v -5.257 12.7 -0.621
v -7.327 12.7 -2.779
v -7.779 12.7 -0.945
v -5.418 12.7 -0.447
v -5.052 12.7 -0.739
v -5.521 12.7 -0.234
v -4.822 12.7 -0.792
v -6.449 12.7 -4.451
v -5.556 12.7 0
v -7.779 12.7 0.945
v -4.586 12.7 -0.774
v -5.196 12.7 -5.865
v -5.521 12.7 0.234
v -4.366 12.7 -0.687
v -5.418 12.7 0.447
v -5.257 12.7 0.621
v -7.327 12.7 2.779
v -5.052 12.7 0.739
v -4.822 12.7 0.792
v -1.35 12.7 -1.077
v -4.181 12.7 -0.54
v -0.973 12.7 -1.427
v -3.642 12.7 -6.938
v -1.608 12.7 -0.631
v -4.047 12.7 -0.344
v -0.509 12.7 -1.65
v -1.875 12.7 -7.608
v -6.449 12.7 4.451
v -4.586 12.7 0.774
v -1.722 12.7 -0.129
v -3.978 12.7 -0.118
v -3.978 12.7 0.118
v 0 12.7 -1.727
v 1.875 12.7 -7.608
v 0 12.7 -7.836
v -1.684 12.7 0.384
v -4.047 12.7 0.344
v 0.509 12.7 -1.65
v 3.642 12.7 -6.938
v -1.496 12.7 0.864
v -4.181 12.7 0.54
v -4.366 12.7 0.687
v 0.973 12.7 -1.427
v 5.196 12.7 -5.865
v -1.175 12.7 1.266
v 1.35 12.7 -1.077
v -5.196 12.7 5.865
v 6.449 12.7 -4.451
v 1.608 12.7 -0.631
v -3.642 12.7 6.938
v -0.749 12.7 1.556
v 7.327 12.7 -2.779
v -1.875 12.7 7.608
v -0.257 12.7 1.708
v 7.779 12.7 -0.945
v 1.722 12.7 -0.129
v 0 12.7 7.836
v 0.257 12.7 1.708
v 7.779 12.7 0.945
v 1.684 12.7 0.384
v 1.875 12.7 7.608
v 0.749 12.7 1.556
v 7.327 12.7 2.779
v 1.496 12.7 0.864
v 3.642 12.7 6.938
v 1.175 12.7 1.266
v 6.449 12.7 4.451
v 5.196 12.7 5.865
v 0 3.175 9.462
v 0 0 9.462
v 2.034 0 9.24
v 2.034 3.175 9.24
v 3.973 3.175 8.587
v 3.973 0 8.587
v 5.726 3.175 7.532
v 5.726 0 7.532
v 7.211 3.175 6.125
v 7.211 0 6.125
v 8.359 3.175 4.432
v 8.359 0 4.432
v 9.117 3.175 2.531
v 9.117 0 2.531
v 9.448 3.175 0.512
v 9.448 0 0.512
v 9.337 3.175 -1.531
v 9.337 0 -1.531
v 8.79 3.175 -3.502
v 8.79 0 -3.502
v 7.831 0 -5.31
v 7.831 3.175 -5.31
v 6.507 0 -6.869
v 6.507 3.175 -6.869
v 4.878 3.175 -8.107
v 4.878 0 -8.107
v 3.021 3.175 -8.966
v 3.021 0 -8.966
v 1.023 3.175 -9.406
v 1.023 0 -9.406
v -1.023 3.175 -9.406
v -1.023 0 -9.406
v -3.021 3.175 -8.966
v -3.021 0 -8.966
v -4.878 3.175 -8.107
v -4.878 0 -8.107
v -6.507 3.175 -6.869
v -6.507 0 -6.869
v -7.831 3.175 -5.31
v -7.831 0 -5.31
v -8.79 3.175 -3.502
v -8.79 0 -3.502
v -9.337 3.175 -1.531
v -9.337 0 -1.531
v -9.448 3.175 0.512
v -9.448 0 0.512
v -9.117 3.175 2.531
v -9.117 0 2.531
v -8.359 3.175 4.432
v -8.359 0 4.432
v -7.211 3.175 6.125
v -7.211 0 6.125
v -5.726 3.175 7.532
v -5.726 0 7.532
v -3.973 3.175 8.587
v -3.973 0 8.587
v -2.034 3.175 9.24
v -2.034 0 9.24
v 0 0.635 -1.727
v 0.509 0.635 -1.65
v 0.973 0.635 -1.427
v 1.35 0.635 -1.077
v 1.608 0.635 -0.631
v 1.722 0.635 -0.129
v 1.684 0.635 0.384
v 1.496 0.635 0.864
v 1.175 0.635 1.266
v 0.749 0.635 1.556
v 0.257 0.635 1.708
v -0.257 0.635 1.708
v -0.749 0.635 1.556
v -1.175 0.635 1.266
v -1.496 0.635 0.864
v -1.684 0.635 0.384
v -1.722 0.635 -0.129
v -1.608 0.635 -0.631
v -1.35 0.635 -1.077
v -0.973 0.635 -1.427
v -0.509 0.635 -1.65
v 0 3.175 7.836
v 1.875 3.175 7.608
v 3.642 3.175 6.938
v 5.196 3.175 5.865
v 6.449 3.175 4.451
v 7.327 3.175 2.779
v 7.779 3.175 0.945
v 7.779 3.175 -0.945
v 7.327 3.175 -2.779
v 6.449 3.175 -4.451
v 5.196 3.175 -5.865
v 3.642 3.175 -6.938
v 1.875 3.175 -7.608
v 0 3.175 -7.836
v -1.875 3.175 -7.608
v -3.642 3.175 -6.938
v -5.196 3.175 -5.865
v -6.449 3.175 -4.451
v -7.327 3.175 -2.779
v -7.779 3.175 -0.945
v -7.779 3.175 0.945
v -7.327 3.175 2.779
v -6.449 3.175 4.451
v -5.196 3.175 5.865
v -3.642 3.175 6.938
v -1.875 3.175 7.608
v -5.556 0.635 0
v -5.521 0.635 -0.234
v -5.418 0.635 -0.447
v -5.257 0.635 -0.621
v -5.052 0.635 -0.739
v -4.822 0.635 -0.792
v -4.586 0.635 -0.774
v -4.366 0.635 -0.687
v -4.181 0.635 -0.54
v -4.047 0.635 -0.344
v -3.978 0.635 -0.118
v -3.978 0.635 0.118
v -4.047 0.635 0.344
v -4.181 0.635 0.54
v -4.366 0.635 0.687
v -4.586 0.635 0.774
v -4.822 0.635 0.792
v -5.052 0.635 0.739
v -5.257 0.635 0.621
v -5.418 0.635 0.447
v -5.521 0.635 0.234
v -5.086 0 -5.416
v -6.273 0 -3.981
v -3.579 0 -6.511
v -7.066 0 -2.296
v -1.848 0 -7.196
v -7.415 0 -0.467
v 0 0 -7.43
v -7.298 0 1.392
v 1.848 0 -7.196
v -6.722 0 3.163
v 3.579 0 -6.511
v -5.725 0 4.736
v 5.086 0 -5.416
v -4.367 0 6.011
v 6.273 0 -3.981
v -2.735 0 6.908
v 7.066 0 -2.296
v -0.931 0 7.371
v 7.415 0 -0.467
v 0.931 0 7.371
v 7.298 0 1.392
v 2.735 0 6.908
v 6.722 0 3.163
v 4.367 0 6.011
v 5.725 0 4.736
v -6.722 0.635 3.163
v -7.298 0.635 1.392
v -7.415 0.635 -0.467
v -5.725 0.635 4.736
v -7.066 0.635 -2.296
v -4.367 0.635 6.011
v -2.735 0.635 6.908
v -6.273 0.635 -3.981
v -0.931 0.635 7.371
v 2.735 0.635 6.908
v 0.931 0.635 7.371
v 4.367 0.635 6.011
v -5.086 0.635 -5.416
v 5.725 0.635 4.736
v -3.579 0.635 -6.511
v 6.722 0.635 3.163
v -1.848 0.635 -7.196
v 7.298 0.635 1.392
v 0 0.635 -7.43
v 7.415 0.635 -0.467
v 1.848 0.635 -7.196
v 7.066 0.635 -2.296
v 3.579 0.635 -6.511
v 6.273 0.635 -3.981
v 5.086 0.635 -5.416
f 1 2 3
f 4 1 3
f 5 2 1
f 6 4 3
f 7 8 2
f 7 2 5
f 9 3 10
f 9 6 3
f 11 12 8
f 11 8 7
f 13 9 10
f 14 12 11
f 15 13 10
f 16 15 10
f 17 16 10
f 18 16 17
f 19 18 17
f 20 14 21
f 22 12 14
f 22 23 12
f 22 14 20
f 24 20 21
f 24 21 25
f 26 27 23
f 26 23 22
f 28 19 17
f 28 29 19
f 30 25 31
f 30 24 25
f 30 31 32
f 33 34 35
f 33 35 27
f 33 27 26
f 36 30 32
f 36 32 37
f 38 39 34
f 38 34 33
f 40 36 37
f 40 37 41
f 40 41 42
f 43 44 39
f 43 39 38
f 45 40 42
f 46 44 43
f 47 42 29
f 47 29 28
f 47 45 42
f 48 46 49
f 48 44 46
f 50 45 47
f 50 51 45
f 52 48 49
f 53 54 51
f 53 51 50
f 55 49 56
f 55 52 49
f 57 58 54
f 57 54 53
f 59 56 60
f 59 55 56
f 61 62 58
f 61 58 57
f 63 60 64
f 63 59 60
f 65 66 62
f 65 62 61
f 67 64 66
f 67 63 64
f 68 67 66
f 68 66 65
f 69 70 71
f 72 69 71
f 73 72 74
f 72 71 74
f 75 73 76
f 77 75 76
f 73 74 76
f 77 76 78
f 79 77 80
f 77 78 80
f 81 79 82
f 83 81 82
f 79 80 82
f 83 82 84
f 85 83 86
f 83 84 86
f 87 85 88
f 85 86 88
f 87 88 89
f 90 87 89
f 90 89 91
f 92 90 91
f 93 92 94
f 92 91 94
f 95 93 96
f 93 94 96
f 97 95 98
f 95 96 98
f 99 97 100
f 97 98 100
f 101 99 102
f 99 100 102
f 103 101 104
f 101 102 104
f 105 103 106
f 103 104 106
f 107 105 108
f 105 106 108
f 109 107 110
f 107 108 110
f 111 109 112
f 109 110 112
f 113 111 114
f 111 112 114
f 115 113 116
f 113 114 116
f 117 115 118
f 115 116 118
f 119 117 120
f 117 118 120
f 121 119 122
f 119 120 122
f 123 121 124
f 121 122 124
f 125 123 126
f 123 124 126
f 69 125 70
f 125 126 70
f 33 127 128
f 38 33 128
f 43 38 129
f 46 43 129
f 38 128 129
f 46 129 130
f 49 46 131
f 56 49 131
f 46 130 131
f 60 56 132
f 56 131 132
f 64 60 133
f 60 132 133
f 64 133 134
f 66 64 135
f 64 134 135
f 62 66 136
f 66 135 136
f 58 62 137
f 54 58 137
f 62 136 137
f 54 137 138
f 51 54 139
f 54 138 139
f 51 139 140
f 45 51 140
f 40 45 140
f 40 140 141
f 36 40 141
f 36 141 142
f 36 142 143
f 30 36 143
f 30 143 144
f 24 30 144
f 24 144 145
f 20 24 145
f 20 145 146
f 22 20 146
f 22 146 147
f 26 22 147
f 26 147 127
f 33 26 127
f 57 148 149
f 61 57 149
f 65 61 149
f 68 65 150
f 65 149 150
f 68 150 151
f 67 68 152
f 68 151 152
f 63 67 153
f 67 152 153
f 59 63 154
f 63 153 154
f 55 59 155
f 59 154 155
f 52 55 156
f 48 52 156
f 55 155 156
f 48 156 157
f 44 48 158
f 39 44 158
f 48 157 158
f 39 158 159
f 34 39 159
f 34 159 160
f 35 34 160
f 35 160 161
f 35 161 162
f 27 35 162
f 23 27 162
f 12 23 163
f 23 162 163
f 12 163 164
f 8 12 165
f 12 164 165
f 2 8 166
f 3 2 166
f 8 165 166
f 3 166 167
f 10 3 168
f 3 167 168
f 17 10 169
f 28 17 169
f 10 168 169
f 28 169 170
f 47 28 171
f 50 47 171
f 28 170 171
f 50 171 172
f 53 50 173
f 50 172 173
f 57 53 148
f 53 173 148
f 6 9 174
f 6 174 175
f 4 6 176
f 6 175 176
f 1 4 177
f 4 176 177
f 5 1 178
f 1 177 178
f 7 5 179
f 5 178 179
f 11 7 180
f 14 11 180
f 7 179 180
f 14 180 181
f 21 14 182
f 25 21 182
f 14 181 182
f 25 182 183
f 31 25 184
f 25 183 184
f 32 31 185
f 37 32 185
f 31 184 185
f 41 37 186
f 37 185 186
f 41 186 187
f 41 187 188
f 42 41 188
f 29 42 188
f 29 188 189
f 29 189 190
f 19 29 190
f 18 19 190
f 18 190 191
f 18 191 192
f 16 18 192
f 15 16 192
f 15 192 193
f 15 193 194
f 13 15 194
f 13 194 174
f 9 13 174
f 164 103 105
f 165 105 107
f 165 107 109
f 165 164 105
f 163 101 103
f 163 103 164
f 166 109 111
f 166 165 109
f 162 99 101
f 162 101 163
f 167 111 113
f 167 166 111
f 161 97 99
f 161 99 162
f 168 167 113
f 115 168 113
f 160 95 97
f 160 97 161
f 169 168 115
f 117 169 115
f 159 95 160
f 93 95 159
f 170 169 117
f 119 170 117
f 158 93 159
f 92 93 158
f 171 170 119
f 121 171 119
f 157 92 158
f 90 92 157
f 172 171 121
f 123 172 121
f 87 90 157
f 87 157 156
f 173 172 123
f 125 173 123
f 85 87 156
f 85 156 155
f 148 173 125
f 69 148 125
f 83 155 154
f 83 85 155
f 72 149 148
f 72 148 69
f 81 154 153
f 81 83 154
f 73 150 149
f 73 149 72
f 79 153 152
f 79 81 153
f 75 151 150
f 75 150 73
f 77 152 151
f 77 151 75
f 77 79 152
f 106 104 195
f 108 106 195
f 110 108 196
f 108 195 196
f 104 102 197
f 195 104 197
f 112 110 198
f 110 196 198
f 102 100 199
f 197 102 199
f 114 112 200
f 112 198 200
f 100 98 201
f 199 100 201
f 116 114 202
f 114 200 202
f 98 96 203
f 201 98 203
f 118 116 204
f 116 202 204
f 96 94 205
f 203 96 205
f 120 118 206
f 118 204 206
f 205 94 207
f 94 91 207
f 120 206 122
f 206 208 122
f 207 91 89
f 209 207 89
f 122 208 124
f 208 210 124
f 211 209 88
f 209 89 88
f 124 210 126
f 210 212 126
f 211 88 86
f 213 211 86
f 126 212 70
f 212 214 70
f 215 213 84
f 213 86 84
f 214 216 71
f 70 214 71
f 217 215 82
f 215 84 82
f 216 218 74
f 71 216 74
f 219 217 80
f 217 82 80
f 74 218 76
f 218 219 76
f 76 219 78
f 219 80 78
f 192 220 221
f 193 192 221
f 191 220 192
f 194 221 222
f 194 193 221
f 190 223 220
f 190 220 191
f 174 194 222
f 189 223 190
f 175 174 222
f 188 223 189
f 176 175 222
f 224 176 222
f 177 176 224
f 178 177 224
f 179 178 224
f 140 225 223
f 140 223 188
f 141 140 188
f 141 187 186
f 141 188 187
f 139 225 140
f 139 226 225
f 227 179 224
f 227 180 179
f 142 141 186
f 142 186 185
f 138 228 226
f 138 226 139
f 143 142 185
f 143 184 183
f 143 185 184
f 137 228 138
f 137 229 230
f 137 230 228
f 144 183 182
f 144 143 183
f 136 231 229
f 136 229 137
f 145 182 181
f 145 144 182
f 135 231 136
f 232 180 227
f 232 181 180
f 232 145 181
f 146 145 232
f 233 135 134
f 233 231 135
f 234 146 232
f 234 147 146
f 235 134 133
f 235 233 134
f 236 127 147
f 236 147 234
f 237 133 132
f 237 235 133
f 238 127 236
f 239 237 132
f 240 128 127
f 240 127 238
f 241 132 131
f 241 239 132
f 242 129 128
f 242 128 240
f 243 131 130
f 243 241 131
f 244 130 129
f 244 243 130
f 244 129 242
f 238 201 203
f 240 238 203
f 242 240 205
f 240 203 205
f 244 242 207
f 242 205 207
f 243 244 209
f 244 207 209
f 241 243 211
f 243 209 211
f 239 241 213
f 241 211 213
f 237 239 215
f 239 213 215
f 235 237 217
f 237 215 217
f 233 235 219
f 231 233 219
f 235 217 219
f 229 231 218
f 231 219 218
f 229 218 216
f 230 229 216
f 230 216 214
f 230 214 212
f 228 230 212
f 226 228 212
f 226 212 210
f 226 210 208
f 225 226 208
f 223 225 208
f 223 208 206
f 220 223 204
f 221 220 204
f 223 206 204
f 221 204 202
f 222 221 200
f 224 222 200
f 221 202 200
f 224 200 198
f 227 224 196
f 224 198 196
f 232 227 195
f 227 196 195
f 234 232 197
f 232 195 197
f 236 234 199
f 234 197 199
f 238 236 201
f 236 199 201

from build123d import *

# Parameters (mm, degrees)
SKETCH1_R                      = 9.4615
EXTRUDE1_DEPTH                 = 3.175
SKETCH2_R                      = 7.8359
EXTRUDE2_DEPTH                 = 9.525
SKETCH3_R                      = 7.4295
CUT_EXTRUDE1_DEPTH             = 0.635
F_8_32_TAPPED_HOLE1_D          = 3.4544
F_8_32_TAPPED_HOLE1_DEPTH      = 12.065
F_1_16_0_0625_DIAMETER_HOLE1_D = 1.5875


with BuildPart() as part:
    # Sketch1 → Extrude1 (new body)
    with BuildSketch(Plane(origin=(0, 0, 0), x_dir=(1, 0, 0), z_dir=(0, 1, 0))):
        with Locations(Location((0, 0, 0), (0, 0, 270))):  # turned: the seam where the file's is
            Circle(SKETCH1_R)
    extrude(amount=EXTRUDE1_DEPTH)

    # Sketch2 → Extrude2 (add)
    with BuildSketch(Plane(origin=(0, 3.175, 0), x_dir=(1, 0, 0), z_dir=(0, 1, 0))):
        with Locations(Location((0, 0, 0), (0, 0, 270))):  # turned: the seam where the file's is
            Circle(SKETCH2_R)
    extrude(amount=EXTRUDE2_DEPTH)

    # Sketch3 → Cut-Extrude1 (cut)
    with BuildSketch(Plane.XZ):
        with Locations(Location((0, 0, 0), (0, 0, 270))):  # turned: the seam where the file's is
            Circle(SKETCH3_R)
    extrude(amount=-CUT_EXTRUDE1_DEPTH, mode=Mode.SUBTRACT)

    # #8-32 Tapped Hole1
    with Locations(Plane.ZX.offset(12.7)):
        with Locations((0, 0)):
            Hole(F_8_32_TAPPED_HOLE1_D / 2, depth=F_8_32_TAPPED_HOLE1_DEPTH)

    # 1/16 (0.0625) Diameter Hole1 (through all)
    with Locations(Plane(origin=(0, 12.7, 0), x_dir=(1, 0, 0), z_dir=(0, 1, 0))):
        with Locations((-4.7625, 0)):
            Hole(F_1_16_0_0625_DIAMETER_HOLE1_D / 2)


solid = part.part
